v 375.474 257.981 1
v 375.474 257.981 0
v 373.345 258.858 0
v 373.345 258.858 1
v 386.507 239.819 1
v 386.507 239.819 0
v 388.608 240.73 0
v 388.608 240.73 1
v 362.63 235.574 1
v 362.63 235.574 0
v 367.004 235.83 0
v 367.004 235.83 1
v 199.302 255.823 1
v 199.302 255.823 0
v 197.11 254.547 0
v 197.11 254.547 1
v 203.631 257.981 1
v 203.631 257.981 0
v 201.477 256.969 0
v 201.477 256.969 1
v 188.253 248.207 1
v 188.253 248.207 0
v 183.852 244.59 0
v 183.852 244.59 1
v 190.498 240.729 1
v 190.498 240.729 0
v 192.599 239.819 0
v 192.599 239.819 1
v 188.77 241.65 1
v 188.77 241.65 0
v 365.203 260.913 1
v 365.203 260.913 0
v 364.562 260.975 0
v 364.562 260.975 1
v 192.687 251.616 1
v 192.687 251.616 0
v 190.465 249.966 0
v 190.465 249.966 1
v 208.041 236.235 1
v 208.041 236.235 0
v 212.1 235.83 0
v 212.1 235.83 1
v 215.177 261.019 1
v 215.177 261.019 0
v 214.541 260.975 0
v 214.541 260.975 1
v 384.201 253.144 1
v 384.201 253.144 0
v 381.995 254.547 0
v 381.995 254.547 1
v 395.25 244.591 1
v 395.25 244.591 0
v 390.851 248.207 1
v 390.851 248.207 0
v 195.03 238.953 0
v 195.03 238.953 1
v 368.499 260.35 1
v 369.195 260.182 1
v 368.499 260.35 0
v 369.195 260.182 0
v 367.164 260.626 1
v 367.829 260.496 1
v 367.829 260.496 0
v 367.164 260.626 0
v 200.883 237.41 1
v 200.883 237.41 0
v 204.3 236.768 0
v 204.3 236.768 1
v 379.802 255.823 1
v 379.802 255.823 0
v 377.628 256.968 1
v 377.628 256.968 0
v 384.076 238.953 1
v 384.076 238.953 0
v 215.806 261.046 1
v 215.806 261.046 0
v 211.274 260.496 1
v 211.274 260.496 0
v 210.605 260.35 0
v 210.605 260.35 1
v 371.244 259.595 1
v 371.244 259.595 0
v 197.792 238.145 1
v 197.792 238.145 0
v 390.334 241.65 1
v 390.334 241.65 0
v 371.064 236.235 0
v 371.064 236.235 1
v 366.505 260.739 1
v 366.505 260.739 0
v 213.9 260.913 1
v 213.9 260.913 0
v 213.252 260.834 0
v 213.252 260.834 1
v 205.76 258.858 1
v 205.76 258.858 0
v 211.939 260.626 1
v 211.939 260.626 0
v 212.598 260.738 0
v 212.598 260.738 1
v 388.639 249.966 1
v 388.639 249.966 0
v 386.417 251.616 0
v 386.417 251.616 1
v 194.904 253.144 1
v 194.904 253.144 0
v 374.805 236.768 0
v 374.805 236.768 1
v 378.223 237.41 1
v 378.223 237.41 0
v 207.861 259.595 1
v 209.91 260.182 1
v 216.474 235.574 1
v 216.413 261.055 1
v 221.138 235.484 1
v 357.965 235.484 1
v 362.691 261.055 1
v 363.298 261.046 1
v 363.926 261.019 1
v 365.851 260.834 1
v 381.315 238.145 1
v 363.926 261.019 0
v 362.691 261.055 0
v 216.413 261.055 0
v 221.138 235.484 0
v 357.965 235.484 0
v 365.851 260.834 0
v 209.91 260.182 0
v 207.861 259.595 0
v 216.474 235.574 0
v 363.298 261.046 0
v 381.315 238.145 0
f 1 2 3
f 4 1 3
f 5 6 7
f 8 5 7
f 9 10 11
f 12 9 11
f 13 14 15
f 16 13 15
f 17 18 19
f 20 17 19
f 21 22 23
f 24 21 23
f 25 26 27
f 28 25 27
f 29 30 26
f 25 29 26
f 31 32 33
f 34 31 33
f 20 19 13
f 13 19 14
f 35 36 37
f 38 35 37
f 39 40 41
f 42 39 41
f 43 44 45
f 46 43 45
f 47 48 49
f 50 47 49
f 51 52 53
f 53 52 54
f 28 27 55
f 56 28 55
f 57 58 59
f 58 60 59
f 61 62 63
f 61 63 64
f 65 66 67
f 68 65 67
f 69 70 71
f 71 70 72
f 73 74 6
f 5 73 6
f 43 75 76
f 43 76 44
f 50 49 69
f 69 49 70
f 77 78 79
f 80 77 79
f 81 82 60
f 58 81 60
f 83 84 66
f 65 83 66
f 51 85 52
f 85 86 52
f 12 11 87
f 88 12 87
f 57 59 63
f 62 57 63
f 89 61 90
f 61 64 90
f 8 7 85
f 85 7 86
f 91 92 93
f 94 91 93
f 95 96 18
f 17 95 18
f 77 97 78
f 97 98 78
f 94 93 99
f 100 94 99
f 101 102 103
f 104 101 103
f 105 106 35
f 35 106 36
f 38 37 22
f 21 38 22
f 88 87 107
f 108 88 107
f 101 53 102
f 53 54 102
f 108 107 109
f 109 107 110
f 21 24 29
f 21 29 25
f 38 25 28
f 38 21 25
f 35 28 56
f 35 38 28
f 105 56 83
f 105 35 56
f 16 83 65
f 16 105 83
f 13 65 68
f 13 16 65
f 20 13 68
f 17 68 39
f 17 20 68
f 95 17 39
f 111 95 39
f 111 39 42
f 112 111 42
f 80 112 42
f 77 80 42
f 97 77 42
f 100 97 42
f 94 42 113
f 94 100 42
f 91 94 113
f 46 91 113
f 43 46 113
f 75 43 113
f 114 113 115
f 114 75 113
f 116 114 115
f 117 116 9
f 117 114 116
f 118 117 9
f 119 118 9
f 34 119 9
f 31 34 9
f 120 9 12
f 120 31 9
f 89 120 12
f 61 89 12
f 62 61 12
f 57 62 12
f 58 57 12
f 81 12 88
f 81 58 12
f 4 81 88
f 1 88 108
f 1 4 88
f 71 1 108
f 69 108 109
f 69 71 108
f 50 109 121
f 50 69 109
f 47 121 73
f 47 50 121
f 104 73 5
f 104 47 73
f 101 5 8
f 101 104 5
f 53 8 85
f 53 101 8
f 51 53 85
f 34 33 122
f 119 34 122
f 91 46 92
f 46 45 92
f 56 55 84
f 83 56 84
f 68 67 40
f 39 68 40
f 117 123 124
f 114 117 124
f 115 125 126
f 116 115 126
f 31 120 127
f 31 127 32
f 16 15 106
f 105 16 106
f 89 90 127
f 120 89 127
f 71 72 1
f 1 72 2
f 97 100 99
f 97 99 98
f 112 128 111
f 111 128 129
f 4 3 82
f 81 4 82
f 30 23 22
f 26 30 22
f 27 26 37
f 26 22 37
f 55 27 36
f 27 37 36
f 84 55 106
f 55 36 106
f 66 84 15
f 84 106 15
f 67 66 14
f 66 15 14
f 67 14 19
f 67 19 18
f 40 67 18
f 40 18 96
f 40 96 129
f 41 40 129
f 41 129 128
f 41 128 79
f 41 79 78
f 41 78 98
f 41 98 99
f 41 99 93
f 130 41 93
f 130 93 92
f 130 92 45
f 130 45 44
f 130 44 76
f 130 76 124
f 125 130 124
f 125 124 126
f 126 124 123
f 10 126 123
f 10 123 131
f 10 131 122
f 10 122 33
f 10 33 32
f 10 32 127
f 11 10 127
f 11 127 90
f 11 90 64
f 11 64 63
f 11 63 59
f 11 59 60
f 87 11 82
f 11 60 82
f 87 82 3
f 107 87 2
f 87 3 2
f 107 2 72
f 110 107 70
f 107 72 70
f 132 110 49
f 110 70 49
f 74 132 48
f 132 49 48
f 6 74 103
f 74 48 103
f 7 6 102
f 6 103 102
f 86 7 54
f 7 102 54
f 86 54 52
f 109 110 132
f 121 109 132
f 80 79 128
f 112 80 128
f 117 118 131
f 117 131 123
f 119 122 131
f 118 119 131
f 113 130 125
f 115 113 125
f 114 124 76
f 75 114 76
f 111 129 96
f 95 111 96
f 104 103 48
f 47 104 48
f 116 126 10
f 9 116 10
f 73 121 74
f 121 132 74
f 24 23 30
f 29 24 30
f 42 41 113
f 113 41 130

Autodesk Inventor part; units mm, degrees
ref_plane "YZ Plane" through (0, 0, 0) normal (1, 0, 0) x (0, 1, 0)
ref_plane "XZ Plane" through (0, 0, 0) normal (0, 1, 0) x (-1, 0, 0)
ref_plane "XY Plane" through (0, 0, 0) normal (0, 0, 1) x (1, 0, 0)
sketch "スケッチ1" plane through (0, 0, 0) normal (0, 0, 1) x (1, 0, 0)
  line L0 (357.9651, 235.4843) -> (362.63, 235.5738)
  line L1 (362.63, 235.5738) -> (367.0044, 235.8303)
  line L2 (367.0044, 235.8303) -> (371.0643, 236.2346)
  line L3 (371.0643, 236.2346) -> (374.8054, 236.7675)
  line L4 (374.8054, 236.7675) -> (378.2233, 237.4103)
  line L5 (378.2233, 237.4103) -> (381.3146, 238.1447)
  line L6 (381.3146, 238.1447) -> (384.0762, 238.953)
  line L7 (384.0762, 238.953) -> (386.507, 239.8191)
  line L8 (386.507, 239.8191) -> (388.6078, 240.7295)
  line L9 (388.6078, 240.7295) -> (390.3342, 241.6502)
  line L10 (390.3342, 241.6502) -> (395.2502, 244.5906)
  line L11 (395.2502, 244.5906) -> (390.8507, 248.2071)
  line L12 (390.8507, 248.2071) -> (388.6394, 249.9662)
  line L13 (388.6394, 249.9662) -> (386.4174, 251.6158)
  line L14 (386.4174, 251.6158) -> (384.2013, 253.1435)
  line L15 (384.2013, 253.1435) -> (381.995, 254.5468)
  line L16 (381.995, 254.5468) -> (379.8025, 255.8227)
  line L17 (379.8025, 255.8227) -> (377.6276, 256.9685)
  line L18 (377.6276, 256.9685) -> (375.4738, 257.9812)
  line L19 (375.4738, 257.9812) -> (373.3448, 258.8578)
  line L20 (373.3448, 258.8578) -> (371.2439, 259.5946)
  line L21 (371.2439, 259.5946) -> (369.1946, 260.1821)
  line L22 (369.1946, 260.1821) -> (368.499, 260.3499)
  line L23 (368.499, 260.3499) -> (367.8292, 260.4961)
  line L24 (367.8292, 260.4961) -> (367.1644, 260.6258)
  line L25 (367.1644, 260.6258) -> (366.5049, 260.7386)
  line L26 (366.5049, 260.7386) -> (365.8512, 260.8345)
  line L27 (365.8512, 260.8345) -> (365.2034, 260.9133)
  line L28 (365.2034, 260.9133) -> (364.5618, 260.9749)
  line L29 (364.5618, 260.9749) -> (363.9265, 261.0192)
  line L30 (363.9265, 261.0192) -> (363.298, 261.0459)
  line L31 (363.298, 261.0459) -> (362.6912, 261.0547)
  line L32 (362.6912, 261.0547) -> (216.4134, 261.0547)
  line L33 (216.4134, 261.0547) -> (215.8059, 261.0459)
  line L34 (215.8059, 261.0459) -> (215.1769, 261.0192)
  line L35 (215.1769, 261.0192) -> (214.5413, 260.9749)
  line L36 (214.5413, 260.9749) -> (213.8996, 260.9133)
  line L37 (213.8996, 260.9133) -> (213.2517, 260.8345)
  line L38 (213.2517, 260.8345) -> (212.598, 260.7385)
  line L39 (212.598, 260.7385) -> (211.9388, 260.6257)
  line L40 (211.9388, 260.6257) -> (211.2743, 260.4961)
  line L41 (211.2743, 260.4961) -> (210.6048, 260.3498)
  line L42 (210.6048, 260.3498) -> (209.9101, 260.1821)
  line L43 (209.9101, 260.1821) -> (207.861, 259.5948)
  line L44 (207.861, 259.5948) -> (205.76, 258.858)
  line L45 (205.76, 258.858) -> (203.631, 257.9815)
  line L46 (203.631, 257.9815) -> (201.4773, 256.9688)
  line L47 (201.4773, 256.9688) -> (199.3024, 255.8229)
  line L48 (199.3024, 255.8229) -> (197.1099, 254.5469)
  line L49 (197.1099, 254.5469) -> (194.9035, 253.1437)
  line L50 (194.9035, 253.1437) -> (192.6871, 251.6159)
  line L51 (192.6871, 251.6159) -> (190.4648, 249.9663)
  line L52 (190.4648, 249.9663) -> (188.253, 248.2073)
  line L53 (188.253, 248.2073) -> (183.8515, 244.5903)
  line L54 (183.8515, 244.5903) -> (188.7703, 241.6499)
  line L55 (188.7703, 241.6499) -> (190.4975, 240.7294)
  line L56 (190.4975, 240.7294) -> (192.5987, 239.8191)
  line L57 (192.5987, 239.8191) -> (195.0298, 238.953)
  line L58 (195.0298, 238.953) -> (197.7916, 238.1447)
  line L59 (197.7916, 238.1447) -> (200.8827, 237.4103)
  line L60 (200.8827, 237.4103) -> (204.3004, 236.7675)
  line L61 (204.3004, 236.7675) -> (208.0411, 236.2346)
  line L62 (208.0411, 236.2346) -> (212.1004, 235.8303)
  line L63 (212.1004, 235.8303) -> (216.4741, 235.5738)
  line L64 (216.4741, 235.5738) -> (221.1379, 235.4843)
  line L65 (221.1379, 235.4843) -> (357.9651, 235.4843)
  point P0 (0, 0)
extrude "押し出し1" add sketch "スケッチ1" along normal blind 1
